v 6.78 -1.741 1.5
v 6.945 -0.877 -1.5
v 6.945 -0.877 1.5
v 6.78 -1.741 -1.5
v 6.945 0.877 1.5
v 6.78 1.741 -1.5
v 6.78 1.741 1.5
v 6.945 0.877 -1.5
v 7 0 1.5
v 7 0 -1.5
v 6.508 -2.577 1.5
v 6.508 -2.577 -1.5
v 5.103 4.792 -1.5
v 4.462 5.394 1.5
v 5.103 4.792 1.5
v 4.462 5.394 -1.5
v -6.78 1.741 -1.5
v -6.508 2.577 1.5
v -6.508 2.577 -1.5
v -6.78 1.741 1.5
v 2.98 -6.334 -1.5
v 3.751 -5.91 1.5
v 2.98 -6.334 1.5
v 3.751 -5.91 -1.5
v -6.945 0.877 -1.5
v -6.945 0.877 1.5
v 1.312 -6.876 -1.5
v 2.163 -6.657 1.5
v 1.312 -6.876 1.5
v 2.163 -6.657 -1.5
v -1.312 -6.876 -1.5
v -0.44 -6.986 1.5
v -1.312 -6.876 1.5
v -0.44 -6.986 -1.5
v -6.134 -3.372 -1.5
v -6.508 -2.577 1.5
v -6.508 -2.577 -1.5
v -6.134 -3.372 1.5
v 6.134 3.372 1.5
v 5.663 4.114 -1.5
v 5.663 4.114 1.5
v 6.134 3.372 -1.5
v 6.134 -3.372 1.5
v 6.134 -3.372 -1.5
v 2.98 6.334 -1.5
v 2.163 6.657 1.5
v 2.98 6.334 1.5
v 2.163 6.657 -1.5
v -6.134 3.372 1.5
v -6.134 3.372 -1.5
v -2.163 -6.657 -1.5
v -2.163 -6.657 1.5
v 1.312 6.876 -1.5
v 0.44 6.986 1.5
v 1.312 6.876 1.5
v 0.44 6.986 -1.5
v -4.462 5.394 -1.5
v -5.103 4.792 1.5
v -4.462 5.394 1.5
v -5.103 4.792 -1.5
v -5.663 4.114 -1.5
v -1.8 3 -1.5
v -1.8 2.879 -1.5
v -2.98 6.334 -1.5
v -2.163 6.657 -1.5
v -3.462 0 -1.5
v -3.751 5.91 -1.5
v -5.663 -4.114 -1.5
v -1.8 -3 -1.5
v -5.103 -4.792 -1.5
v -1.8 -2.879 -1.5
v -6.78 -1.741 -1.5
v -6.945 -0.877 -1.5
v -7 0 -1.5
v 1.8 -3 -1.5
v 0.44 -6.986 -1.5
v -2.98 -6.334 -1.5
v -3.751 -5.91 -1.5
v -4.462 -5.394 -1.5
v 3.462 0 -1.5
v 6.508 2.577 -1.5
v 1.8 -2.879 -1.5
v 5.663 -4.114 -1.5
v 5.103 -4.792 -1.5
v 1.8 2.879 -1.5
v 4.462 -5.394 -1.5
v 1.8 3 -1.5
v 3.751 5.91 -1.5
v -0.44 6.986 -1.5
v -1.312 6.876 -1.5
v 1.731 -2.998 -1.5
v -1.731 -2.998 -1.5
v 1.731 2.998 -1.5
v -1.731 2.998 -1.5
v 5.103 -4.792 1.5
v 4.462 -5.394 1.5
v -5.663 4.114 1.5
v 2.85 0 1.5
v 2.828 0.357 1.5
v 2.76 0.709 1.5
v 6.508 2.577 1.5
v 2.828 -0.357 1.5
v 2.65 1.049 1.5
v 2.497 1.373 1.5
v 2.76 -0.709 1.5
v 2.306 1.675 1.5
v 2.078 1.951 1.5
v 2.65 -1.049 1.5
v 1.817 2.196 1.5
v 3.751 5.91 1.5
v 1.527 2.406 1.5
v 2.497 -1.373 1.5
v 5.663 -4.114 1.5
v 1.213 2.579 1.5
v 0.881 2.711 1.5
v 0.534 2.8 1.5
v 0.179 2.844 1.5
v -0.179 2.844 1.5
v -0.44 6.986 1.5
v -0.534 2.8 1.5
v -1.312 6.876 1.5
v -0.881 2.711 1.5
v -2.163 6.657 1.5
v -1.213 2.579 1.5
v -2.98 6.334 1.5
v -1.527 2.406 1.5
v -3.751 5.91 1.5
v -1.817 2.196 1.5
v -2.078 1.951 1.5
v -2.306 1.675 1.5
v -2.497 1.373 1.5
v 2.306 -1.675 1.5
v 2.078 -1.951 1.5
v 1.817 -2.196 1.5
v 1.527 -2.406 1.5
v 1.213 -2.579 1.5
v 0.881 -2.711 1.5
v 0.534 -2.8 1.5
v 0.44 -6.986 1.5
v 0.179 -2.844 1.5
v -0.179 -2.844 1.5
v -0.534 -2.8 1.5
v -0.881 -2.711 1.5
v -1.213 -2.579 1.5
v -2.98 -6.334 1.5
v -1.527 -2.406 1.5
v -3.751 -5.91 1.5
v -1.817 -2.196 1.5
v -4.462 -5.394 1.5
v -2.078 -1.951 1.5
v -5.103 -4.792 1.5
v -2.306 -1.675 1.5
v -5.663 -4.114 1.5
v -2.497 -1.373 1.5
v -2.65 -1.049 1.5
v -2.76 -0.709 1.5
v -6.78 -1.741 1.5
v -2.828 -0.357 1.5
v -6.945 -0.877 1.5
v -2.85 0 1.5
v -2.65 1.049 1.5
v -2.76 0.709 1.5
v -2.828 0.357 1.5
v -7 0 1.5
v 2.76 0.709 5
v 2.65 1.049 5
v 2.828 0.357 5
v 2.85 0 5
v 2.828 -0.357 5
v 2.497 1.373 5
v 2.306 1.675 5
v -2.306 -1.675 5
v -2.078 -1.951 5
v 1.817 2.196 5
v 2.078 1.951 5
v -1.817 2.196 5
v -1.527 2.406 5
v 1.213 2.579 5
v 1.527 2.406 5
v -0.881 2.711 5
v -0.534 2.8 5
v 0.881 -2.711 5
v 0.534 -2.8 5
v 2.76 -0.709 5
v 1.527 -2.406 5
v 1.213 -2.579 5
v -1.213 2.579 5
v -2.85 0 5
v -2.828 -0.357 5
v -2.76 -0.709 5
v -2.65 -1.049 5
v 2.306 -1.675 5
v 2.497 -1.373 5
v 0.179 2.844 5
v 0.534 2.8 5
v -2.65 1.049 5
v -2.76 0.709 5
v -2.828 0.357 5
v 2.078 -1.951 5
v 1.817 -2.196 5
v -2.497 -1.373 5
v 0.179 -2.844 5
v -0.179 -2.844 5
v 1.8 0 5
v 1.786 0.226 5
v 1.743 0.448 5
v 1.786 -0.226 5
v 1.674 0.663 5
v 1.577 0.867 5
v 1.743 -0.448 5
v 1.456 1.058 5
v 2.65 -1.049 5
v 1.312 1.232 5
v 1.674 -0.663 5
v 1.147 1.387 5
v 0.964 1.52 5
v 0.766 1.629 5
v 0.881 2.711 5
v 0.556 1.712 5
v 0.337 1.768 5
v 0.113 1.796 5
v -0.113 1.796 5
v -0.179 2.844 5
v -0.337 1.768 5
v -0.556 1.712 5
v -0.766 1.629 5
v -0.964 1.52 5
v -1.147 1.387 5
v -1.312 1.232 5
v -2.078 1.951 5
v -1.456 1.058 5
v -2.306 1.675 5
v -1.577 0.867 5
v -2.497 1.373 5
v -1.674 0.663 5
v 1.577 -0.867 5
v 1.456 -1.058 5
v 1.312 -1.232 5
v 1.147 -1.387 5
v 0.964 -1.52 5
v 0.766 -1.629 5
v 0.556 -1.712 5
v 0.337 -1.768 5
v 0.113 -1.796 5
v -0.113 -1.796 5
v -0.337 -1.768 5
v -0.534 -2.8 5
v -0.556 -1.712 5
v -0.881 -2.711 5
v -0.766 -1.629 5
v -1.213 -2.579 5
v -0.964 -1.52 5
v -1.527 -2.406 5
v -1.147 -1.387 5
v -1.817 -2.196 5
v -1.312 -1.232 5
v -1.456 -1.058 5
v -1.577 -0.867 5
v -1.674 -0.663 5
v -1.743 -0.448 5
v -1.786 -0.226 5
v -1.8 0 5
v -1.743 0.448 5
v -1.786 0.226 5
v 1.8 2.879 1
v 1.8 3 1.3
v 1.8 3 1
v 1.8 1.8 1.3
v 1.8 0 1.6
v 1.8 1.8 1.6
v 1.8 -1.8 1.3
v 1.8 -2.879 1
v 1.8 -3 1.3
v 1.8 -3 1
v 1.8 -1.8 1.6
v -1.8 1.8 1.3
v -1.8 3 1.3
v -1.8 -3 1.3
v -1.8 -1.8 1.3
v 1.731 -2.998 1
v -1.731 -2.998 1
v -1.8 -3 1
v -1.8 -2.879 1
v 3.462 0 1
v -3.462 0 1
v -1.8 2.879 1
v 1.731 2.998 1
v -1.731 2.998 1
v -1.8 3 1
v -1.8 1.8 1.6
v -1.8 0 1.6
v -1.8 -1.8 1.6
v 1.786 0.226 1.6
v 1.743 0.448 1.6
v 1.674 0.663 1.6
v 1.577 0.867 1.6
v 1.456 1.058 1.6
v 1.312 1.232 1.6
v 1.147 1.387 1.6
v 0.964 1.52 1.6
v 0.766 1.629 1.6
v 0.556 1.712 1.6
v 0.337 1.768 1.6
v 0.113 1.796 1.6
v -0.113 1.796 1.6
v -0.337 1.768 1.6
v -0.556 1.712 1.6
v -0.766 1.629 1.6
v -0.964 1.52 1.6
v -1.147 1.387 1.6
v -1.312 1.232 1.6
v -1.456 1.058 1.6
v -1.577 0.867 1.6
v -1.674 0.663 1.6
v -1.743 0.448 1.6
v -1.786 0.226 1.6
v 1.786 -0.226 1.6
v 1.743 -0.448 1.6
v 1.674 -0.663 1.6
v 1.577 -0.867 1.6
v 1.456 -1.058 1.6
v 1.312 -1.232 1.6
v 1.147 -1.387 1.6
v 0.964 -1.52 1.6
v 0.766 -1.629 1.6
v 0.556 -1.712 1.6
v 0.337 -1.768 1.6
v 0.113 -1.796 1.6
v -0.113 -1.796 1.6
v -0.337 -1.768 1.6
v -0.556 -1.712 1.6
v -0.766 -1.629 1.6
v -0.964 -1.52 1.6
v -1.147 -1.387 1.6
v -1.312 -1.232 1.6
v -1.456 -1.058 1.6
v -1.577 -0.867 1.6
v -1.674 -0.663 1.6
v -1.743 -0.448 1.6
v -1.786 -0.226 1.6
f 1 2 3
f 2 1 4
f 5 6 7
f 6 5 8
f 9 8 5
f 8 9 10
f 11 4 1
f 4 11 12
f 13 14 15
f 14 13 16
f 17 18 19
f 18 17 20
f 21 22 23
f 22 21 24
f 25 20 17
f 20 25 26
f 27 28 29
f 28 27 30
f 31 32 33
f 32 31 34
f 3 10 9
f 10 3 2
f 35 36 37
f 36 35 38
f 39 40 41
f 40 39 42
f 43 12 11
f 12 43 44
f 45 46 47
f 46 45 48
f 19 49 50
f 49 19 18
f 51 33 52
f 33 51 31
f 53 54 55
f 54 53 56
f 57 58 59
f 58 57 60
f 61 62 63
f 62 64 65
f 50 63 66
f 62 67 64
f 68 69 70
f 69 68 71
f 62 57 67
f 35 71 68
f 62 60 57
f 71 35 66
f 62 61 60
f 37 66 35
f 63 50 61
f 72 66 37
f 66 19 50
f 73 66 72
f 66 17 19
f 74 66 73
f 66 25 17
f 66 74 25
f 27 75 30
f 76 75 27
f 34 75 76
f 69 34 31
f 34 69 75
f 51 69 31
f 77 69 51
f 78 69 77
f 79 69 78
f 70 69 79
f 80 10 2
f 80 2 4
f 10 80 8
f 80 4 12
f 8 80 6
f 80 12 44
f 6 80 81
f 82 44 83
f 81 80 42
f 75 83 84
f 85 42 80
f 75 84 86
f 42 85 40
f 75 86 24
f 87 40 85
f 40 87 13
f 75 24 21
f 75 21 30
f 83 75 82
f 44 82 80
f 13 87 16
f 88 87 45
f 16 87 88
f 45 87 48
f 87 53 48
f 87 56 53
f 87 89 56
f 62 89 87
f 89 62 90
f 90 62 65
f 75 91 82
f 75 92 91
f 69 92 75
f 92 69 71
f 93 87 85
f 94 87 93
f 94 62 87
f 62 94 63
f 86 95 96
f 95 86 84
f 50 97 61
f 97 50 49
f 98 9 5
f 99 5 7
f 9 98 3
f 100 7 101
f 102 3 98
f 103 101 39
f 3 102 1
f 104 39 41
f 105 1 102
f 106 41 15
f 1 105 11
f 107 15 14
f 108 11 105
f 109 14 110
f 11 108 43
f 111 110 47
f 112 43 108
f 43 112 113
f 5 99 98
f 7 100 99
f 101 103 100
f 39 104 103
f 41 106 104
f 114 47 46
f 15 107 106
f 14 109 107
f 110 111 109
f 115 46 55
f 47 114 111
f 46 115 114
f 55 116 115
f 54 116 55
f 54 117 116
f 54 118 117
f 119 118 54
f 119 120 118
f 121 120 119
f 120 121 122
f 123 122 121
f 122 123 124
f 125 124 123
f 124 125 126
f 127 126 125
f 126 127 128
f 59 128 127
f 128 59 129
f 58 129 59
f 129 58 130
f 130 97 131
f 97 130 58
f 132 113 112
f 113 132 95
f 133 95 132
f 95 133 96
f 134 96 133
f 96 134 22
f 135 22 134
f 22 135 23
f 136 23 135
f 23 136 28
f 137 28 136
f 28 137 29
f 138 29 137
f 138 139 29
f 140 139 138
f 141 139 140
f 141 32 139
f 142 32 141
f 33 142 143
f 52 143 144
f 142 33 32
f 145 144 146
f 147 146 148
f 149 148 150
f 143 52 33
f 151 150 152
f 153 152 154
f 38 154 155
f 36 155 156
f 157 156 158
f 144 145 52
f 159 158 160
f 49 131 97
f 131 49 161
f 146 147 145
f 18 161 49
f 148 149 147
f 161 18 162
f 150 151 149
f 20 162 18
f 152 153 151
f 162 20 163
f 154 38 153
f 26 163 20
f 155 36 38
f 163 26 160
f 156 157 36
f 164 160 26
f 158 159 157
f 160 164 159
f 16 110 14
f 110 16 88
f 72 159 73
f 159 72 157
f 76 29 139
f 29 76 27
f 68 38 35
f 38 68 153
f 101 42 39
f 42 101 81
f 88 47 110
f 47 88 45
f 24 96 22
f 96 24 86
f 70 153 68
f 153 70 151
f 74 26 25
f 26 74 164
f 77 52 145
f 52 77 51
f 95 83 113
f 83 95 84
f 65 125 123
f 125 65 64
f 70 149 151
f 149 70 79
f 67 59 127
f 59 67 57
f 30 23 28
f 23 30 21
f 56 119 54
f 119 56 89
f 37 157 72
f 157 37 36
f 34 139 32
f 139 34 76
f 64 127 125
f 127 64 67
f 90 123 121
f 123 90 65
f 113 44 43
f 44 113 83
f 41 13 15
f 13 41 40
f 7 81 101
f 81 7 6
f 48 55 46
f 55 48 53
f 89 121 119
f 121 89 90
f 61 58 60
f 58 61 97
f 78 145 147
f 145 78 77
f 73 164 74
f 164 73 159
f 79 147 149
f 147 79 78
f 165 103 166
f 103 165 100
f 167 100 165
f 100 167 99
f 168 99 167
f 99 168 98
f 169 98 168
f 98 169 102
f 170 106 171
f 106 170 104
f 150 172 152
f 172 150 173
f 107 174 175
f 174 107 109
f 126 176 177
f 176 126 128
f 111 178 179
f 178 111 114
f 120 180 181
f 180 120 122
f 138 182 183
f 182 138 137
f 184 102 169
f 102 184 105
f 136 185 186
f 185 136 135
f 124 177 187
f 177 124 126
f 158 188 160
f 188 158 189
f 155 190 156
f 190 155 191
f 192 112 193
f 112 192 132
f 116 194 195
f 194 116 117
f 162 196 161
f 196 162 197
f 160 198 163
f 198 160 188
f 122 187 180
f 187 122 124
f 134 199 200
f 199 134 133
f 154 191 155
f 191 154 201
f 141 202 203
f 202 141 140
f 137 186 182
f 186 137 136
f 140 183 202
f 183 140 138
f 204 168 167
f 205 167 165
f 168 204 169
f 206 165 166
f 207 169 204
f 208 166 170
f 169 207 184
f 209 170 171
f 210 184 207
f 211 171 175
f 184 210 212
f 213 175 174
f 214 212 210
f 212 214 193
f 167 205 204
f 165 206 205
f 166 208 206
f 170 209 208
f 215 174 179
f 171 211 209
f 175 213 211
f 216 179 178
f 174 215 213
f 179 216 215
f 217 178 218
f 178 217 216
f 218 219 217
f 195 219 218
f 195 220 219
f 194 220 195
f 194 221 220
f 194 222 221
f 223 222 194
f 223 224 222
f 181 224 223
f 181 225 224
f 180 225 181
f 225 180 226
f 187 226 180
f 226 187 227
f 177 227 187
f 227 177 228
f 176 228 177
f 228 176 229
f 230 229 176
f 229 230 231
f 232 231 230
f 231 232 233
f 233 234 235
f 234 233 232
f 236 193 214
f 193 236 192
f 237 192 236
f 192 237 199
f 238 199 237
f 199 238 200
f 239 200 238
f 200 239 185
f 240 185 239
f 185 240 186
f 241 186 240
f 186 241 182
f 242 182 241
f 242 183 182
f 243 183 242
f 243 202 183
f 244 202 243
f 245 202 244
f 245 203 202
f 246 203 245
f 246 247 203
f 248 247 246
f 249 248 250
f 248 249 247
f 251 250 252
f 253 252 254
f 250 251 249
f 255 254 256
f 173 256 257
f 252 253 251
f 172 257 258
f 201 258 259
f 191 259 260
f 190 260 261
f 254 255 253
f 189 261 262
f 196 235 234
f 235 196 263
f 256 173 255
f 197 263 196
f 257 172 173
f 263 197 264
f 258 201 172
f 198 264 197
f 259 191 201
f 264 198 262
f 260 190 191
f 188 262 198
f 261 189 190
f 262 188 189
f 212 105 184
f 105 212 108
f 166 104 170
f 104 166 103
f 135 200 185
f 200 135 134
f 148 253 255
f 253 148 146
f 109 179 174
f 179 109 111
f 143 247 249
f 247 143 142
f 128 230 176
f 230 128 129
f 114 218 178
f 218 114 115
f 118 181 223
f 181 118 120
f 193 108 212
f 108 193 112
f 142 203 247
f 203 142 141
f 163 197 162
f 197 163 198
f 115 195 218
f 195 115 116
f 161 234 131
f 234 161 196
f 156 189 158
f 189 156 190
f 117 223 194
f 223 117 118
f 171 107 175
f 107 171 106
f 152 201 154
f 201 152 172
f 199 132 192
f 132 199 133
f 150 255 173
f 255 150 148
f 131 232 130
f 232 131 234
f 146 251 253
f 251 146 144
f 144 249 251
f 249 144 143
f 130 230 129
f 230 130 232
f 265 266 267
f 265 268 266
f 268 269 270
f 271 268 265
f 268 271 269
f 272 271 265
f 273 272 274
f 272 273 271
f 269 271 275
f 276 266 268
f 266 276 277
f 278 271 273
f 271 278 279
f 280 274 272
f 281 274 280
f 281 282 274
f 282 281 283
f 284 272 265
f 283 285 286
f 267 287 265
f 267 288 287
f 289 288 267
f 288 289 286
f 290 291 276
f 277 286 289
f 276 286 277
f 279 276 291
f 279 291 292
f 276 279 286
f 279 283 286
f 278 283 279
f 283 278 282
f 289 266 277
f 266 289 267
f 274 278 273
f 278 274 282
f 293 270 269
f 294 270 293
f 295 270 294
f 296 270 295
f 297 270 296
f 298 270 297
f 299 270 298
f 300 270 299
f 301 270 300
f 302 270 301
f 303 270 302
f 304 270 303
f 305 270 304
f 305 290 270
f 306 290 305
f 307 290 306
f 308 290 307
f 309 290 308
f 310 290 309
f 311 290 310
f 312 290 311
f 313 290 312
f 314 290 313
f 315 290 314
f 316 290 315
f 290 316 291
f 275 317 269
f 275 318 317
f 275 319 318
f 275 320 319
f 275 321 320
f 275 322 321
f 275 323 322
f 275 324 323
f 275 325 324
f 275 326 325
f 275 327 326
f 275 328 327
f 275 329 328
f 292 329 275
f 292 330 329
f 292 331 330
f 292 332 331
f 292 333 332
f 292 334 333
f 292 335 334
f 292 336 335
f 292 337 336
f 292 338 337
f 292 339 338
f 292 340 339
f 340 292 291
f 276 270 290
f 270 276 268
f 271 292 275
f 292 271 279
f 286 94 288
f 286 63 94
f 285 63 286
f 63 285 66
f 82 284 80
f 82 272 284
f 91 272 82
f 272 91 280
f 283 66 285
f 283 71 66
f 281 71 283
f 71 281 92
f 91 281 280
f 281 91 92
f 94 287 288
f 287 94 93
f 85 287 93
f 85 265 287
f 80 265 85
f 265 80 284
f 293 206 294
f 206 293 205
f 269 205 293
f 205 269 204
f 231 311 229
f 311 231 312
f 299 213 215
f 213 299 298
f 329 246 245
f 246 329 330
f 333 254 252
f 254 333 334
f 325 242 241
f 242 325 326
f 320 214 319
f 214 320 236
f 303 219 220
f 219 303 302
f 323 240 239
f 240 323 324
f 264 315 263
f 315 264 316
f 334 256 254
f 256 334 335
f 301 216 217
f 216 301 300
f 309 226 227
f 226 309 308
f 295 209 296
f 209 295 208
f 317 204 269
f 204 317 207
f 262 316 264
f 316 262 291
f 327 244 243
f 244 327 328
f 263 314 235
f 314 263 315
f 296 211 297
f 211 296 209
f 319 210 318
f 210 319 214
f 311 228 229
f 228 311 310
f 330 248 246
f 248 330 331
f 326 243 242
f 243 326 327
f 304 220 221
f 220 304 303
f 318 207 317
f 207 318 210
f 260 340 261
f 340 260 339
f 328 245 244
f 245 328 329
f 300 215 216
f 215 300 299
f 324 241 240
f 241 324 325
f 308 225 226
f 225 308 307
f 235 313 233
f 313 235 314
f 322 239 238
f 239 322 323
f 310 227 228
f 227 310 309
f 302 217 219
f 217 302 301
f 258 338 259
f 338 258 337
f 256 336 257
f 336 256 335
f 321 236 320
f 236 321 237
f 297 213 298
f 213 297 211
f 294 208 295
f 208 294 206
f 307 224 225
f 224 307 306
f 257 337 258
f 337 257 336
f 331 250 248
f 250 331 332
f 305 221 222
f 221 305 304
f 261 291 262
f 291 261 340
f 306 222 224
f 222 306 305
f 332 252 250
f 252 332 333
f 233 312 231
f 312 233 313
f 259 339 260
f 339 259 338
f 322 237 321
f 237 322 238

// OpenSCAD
$fn = 50;


difference() {
	union() {
		translate(v = [0, 0, -1.5000000000]) {
			cylinder(h = 3, r = 7.0000000000);
		}
		translate(v = [0, 0, -1.5000000000]) {
			cylinder(h = 6.5000000000, r = 2.8500000000);
		}
	}
	union() {
		translate(v = [0, 0, -1.5000000000]) {
			rotate(a = [0, 0, 0]) {
				difference() {
					union() {
						translate(v = [-1.8000000000, -3.0000000000, -0.3000000000]) {
							cube(size = [3.6000000000, 6.0000000000, 0.3000000000]);
						}
						translate(v = [-1.8000000000, -1.8000000000, -0.6000000000]) {
							cube(size = [3.6000000000, 3.6000000000, 0.3000000000]);
						}
						translate(v = [-1.8000000000, -3.0000000000, 2.5000000000]) {
							cube(size = [3.6000000000, 6.0000000000, 0.3000000000]);
						}
						translate(v = [-1.8000000000, -1.8000000000, 2.8000000000]) {
							cube(size = [3.6000000000, 3.6000000000, 0.3000000000]);
						}
						linear_extrude(height = 2.5000000000) {
							polygon(points = [[3.4620000000, 0.0000000000], [1.7310000000, 2.9981799479], [-1.7310000000, 2.9981799479], [-3.4620000000, 0.0000000000], [-1.7310000000, -2.9981799479], [1.7310000000, -2.9981799479]]);
						}
						translate(v = [-1.8000000000, -3.0000000000, -0.3000000000]) {
							cube(size = [3.6000000000, 6.0000000000, 0.3000000000]);
						}
						translate(v = [-1.8000000000, -1.8000000000, -0.6000000000]) {
							cube(size = [3.6000000000, 3.6000000000, 0.3000000000]);
						}
						translate(v = [-1.8000000000, -3.0000000000, 2.5000000000]) {
							cube(size = [3.6000000000, 6.0000000000, 0.3000000000]);
						}
						translate(v = [-1.8000000000, -1.8000000000, 2.8000000000]) {
							cube(size = [3.6000000000, 3.6000000000, 0.3000000000]);
						}
						translate(v = [-1.8000000000, -3.0000000000, -0.3000000000]) {
							cube(size = [3.6000000000, 6.0000000000, 0.3000000000]);
						}
						translate(v = [-1.8000000000, -1.8000000000, -0.6000000000]) {
							cube(size = [3.6000000000, 3.6000000000, 0.3000000000]);
						}
						translate(v = [-1.8000000000, -3.0000000000, 2.5000000000]) {
							cube(size = [3.6000000000, 6.0000000000, 0.3000000000]);
						}
						translate(v = [-1.8000000000, -1.8000000000, 2.8000000000]) {
							cube(size = [3.6000000000, 3.6000000000, 0.3000000000]);
						}
					}
					union();
				}
			}
		}
		translate(v = [0, 0, -50.0000000000]) {
			cylinder(h = 100, r = 1.8000000000);
		}
	}
}
